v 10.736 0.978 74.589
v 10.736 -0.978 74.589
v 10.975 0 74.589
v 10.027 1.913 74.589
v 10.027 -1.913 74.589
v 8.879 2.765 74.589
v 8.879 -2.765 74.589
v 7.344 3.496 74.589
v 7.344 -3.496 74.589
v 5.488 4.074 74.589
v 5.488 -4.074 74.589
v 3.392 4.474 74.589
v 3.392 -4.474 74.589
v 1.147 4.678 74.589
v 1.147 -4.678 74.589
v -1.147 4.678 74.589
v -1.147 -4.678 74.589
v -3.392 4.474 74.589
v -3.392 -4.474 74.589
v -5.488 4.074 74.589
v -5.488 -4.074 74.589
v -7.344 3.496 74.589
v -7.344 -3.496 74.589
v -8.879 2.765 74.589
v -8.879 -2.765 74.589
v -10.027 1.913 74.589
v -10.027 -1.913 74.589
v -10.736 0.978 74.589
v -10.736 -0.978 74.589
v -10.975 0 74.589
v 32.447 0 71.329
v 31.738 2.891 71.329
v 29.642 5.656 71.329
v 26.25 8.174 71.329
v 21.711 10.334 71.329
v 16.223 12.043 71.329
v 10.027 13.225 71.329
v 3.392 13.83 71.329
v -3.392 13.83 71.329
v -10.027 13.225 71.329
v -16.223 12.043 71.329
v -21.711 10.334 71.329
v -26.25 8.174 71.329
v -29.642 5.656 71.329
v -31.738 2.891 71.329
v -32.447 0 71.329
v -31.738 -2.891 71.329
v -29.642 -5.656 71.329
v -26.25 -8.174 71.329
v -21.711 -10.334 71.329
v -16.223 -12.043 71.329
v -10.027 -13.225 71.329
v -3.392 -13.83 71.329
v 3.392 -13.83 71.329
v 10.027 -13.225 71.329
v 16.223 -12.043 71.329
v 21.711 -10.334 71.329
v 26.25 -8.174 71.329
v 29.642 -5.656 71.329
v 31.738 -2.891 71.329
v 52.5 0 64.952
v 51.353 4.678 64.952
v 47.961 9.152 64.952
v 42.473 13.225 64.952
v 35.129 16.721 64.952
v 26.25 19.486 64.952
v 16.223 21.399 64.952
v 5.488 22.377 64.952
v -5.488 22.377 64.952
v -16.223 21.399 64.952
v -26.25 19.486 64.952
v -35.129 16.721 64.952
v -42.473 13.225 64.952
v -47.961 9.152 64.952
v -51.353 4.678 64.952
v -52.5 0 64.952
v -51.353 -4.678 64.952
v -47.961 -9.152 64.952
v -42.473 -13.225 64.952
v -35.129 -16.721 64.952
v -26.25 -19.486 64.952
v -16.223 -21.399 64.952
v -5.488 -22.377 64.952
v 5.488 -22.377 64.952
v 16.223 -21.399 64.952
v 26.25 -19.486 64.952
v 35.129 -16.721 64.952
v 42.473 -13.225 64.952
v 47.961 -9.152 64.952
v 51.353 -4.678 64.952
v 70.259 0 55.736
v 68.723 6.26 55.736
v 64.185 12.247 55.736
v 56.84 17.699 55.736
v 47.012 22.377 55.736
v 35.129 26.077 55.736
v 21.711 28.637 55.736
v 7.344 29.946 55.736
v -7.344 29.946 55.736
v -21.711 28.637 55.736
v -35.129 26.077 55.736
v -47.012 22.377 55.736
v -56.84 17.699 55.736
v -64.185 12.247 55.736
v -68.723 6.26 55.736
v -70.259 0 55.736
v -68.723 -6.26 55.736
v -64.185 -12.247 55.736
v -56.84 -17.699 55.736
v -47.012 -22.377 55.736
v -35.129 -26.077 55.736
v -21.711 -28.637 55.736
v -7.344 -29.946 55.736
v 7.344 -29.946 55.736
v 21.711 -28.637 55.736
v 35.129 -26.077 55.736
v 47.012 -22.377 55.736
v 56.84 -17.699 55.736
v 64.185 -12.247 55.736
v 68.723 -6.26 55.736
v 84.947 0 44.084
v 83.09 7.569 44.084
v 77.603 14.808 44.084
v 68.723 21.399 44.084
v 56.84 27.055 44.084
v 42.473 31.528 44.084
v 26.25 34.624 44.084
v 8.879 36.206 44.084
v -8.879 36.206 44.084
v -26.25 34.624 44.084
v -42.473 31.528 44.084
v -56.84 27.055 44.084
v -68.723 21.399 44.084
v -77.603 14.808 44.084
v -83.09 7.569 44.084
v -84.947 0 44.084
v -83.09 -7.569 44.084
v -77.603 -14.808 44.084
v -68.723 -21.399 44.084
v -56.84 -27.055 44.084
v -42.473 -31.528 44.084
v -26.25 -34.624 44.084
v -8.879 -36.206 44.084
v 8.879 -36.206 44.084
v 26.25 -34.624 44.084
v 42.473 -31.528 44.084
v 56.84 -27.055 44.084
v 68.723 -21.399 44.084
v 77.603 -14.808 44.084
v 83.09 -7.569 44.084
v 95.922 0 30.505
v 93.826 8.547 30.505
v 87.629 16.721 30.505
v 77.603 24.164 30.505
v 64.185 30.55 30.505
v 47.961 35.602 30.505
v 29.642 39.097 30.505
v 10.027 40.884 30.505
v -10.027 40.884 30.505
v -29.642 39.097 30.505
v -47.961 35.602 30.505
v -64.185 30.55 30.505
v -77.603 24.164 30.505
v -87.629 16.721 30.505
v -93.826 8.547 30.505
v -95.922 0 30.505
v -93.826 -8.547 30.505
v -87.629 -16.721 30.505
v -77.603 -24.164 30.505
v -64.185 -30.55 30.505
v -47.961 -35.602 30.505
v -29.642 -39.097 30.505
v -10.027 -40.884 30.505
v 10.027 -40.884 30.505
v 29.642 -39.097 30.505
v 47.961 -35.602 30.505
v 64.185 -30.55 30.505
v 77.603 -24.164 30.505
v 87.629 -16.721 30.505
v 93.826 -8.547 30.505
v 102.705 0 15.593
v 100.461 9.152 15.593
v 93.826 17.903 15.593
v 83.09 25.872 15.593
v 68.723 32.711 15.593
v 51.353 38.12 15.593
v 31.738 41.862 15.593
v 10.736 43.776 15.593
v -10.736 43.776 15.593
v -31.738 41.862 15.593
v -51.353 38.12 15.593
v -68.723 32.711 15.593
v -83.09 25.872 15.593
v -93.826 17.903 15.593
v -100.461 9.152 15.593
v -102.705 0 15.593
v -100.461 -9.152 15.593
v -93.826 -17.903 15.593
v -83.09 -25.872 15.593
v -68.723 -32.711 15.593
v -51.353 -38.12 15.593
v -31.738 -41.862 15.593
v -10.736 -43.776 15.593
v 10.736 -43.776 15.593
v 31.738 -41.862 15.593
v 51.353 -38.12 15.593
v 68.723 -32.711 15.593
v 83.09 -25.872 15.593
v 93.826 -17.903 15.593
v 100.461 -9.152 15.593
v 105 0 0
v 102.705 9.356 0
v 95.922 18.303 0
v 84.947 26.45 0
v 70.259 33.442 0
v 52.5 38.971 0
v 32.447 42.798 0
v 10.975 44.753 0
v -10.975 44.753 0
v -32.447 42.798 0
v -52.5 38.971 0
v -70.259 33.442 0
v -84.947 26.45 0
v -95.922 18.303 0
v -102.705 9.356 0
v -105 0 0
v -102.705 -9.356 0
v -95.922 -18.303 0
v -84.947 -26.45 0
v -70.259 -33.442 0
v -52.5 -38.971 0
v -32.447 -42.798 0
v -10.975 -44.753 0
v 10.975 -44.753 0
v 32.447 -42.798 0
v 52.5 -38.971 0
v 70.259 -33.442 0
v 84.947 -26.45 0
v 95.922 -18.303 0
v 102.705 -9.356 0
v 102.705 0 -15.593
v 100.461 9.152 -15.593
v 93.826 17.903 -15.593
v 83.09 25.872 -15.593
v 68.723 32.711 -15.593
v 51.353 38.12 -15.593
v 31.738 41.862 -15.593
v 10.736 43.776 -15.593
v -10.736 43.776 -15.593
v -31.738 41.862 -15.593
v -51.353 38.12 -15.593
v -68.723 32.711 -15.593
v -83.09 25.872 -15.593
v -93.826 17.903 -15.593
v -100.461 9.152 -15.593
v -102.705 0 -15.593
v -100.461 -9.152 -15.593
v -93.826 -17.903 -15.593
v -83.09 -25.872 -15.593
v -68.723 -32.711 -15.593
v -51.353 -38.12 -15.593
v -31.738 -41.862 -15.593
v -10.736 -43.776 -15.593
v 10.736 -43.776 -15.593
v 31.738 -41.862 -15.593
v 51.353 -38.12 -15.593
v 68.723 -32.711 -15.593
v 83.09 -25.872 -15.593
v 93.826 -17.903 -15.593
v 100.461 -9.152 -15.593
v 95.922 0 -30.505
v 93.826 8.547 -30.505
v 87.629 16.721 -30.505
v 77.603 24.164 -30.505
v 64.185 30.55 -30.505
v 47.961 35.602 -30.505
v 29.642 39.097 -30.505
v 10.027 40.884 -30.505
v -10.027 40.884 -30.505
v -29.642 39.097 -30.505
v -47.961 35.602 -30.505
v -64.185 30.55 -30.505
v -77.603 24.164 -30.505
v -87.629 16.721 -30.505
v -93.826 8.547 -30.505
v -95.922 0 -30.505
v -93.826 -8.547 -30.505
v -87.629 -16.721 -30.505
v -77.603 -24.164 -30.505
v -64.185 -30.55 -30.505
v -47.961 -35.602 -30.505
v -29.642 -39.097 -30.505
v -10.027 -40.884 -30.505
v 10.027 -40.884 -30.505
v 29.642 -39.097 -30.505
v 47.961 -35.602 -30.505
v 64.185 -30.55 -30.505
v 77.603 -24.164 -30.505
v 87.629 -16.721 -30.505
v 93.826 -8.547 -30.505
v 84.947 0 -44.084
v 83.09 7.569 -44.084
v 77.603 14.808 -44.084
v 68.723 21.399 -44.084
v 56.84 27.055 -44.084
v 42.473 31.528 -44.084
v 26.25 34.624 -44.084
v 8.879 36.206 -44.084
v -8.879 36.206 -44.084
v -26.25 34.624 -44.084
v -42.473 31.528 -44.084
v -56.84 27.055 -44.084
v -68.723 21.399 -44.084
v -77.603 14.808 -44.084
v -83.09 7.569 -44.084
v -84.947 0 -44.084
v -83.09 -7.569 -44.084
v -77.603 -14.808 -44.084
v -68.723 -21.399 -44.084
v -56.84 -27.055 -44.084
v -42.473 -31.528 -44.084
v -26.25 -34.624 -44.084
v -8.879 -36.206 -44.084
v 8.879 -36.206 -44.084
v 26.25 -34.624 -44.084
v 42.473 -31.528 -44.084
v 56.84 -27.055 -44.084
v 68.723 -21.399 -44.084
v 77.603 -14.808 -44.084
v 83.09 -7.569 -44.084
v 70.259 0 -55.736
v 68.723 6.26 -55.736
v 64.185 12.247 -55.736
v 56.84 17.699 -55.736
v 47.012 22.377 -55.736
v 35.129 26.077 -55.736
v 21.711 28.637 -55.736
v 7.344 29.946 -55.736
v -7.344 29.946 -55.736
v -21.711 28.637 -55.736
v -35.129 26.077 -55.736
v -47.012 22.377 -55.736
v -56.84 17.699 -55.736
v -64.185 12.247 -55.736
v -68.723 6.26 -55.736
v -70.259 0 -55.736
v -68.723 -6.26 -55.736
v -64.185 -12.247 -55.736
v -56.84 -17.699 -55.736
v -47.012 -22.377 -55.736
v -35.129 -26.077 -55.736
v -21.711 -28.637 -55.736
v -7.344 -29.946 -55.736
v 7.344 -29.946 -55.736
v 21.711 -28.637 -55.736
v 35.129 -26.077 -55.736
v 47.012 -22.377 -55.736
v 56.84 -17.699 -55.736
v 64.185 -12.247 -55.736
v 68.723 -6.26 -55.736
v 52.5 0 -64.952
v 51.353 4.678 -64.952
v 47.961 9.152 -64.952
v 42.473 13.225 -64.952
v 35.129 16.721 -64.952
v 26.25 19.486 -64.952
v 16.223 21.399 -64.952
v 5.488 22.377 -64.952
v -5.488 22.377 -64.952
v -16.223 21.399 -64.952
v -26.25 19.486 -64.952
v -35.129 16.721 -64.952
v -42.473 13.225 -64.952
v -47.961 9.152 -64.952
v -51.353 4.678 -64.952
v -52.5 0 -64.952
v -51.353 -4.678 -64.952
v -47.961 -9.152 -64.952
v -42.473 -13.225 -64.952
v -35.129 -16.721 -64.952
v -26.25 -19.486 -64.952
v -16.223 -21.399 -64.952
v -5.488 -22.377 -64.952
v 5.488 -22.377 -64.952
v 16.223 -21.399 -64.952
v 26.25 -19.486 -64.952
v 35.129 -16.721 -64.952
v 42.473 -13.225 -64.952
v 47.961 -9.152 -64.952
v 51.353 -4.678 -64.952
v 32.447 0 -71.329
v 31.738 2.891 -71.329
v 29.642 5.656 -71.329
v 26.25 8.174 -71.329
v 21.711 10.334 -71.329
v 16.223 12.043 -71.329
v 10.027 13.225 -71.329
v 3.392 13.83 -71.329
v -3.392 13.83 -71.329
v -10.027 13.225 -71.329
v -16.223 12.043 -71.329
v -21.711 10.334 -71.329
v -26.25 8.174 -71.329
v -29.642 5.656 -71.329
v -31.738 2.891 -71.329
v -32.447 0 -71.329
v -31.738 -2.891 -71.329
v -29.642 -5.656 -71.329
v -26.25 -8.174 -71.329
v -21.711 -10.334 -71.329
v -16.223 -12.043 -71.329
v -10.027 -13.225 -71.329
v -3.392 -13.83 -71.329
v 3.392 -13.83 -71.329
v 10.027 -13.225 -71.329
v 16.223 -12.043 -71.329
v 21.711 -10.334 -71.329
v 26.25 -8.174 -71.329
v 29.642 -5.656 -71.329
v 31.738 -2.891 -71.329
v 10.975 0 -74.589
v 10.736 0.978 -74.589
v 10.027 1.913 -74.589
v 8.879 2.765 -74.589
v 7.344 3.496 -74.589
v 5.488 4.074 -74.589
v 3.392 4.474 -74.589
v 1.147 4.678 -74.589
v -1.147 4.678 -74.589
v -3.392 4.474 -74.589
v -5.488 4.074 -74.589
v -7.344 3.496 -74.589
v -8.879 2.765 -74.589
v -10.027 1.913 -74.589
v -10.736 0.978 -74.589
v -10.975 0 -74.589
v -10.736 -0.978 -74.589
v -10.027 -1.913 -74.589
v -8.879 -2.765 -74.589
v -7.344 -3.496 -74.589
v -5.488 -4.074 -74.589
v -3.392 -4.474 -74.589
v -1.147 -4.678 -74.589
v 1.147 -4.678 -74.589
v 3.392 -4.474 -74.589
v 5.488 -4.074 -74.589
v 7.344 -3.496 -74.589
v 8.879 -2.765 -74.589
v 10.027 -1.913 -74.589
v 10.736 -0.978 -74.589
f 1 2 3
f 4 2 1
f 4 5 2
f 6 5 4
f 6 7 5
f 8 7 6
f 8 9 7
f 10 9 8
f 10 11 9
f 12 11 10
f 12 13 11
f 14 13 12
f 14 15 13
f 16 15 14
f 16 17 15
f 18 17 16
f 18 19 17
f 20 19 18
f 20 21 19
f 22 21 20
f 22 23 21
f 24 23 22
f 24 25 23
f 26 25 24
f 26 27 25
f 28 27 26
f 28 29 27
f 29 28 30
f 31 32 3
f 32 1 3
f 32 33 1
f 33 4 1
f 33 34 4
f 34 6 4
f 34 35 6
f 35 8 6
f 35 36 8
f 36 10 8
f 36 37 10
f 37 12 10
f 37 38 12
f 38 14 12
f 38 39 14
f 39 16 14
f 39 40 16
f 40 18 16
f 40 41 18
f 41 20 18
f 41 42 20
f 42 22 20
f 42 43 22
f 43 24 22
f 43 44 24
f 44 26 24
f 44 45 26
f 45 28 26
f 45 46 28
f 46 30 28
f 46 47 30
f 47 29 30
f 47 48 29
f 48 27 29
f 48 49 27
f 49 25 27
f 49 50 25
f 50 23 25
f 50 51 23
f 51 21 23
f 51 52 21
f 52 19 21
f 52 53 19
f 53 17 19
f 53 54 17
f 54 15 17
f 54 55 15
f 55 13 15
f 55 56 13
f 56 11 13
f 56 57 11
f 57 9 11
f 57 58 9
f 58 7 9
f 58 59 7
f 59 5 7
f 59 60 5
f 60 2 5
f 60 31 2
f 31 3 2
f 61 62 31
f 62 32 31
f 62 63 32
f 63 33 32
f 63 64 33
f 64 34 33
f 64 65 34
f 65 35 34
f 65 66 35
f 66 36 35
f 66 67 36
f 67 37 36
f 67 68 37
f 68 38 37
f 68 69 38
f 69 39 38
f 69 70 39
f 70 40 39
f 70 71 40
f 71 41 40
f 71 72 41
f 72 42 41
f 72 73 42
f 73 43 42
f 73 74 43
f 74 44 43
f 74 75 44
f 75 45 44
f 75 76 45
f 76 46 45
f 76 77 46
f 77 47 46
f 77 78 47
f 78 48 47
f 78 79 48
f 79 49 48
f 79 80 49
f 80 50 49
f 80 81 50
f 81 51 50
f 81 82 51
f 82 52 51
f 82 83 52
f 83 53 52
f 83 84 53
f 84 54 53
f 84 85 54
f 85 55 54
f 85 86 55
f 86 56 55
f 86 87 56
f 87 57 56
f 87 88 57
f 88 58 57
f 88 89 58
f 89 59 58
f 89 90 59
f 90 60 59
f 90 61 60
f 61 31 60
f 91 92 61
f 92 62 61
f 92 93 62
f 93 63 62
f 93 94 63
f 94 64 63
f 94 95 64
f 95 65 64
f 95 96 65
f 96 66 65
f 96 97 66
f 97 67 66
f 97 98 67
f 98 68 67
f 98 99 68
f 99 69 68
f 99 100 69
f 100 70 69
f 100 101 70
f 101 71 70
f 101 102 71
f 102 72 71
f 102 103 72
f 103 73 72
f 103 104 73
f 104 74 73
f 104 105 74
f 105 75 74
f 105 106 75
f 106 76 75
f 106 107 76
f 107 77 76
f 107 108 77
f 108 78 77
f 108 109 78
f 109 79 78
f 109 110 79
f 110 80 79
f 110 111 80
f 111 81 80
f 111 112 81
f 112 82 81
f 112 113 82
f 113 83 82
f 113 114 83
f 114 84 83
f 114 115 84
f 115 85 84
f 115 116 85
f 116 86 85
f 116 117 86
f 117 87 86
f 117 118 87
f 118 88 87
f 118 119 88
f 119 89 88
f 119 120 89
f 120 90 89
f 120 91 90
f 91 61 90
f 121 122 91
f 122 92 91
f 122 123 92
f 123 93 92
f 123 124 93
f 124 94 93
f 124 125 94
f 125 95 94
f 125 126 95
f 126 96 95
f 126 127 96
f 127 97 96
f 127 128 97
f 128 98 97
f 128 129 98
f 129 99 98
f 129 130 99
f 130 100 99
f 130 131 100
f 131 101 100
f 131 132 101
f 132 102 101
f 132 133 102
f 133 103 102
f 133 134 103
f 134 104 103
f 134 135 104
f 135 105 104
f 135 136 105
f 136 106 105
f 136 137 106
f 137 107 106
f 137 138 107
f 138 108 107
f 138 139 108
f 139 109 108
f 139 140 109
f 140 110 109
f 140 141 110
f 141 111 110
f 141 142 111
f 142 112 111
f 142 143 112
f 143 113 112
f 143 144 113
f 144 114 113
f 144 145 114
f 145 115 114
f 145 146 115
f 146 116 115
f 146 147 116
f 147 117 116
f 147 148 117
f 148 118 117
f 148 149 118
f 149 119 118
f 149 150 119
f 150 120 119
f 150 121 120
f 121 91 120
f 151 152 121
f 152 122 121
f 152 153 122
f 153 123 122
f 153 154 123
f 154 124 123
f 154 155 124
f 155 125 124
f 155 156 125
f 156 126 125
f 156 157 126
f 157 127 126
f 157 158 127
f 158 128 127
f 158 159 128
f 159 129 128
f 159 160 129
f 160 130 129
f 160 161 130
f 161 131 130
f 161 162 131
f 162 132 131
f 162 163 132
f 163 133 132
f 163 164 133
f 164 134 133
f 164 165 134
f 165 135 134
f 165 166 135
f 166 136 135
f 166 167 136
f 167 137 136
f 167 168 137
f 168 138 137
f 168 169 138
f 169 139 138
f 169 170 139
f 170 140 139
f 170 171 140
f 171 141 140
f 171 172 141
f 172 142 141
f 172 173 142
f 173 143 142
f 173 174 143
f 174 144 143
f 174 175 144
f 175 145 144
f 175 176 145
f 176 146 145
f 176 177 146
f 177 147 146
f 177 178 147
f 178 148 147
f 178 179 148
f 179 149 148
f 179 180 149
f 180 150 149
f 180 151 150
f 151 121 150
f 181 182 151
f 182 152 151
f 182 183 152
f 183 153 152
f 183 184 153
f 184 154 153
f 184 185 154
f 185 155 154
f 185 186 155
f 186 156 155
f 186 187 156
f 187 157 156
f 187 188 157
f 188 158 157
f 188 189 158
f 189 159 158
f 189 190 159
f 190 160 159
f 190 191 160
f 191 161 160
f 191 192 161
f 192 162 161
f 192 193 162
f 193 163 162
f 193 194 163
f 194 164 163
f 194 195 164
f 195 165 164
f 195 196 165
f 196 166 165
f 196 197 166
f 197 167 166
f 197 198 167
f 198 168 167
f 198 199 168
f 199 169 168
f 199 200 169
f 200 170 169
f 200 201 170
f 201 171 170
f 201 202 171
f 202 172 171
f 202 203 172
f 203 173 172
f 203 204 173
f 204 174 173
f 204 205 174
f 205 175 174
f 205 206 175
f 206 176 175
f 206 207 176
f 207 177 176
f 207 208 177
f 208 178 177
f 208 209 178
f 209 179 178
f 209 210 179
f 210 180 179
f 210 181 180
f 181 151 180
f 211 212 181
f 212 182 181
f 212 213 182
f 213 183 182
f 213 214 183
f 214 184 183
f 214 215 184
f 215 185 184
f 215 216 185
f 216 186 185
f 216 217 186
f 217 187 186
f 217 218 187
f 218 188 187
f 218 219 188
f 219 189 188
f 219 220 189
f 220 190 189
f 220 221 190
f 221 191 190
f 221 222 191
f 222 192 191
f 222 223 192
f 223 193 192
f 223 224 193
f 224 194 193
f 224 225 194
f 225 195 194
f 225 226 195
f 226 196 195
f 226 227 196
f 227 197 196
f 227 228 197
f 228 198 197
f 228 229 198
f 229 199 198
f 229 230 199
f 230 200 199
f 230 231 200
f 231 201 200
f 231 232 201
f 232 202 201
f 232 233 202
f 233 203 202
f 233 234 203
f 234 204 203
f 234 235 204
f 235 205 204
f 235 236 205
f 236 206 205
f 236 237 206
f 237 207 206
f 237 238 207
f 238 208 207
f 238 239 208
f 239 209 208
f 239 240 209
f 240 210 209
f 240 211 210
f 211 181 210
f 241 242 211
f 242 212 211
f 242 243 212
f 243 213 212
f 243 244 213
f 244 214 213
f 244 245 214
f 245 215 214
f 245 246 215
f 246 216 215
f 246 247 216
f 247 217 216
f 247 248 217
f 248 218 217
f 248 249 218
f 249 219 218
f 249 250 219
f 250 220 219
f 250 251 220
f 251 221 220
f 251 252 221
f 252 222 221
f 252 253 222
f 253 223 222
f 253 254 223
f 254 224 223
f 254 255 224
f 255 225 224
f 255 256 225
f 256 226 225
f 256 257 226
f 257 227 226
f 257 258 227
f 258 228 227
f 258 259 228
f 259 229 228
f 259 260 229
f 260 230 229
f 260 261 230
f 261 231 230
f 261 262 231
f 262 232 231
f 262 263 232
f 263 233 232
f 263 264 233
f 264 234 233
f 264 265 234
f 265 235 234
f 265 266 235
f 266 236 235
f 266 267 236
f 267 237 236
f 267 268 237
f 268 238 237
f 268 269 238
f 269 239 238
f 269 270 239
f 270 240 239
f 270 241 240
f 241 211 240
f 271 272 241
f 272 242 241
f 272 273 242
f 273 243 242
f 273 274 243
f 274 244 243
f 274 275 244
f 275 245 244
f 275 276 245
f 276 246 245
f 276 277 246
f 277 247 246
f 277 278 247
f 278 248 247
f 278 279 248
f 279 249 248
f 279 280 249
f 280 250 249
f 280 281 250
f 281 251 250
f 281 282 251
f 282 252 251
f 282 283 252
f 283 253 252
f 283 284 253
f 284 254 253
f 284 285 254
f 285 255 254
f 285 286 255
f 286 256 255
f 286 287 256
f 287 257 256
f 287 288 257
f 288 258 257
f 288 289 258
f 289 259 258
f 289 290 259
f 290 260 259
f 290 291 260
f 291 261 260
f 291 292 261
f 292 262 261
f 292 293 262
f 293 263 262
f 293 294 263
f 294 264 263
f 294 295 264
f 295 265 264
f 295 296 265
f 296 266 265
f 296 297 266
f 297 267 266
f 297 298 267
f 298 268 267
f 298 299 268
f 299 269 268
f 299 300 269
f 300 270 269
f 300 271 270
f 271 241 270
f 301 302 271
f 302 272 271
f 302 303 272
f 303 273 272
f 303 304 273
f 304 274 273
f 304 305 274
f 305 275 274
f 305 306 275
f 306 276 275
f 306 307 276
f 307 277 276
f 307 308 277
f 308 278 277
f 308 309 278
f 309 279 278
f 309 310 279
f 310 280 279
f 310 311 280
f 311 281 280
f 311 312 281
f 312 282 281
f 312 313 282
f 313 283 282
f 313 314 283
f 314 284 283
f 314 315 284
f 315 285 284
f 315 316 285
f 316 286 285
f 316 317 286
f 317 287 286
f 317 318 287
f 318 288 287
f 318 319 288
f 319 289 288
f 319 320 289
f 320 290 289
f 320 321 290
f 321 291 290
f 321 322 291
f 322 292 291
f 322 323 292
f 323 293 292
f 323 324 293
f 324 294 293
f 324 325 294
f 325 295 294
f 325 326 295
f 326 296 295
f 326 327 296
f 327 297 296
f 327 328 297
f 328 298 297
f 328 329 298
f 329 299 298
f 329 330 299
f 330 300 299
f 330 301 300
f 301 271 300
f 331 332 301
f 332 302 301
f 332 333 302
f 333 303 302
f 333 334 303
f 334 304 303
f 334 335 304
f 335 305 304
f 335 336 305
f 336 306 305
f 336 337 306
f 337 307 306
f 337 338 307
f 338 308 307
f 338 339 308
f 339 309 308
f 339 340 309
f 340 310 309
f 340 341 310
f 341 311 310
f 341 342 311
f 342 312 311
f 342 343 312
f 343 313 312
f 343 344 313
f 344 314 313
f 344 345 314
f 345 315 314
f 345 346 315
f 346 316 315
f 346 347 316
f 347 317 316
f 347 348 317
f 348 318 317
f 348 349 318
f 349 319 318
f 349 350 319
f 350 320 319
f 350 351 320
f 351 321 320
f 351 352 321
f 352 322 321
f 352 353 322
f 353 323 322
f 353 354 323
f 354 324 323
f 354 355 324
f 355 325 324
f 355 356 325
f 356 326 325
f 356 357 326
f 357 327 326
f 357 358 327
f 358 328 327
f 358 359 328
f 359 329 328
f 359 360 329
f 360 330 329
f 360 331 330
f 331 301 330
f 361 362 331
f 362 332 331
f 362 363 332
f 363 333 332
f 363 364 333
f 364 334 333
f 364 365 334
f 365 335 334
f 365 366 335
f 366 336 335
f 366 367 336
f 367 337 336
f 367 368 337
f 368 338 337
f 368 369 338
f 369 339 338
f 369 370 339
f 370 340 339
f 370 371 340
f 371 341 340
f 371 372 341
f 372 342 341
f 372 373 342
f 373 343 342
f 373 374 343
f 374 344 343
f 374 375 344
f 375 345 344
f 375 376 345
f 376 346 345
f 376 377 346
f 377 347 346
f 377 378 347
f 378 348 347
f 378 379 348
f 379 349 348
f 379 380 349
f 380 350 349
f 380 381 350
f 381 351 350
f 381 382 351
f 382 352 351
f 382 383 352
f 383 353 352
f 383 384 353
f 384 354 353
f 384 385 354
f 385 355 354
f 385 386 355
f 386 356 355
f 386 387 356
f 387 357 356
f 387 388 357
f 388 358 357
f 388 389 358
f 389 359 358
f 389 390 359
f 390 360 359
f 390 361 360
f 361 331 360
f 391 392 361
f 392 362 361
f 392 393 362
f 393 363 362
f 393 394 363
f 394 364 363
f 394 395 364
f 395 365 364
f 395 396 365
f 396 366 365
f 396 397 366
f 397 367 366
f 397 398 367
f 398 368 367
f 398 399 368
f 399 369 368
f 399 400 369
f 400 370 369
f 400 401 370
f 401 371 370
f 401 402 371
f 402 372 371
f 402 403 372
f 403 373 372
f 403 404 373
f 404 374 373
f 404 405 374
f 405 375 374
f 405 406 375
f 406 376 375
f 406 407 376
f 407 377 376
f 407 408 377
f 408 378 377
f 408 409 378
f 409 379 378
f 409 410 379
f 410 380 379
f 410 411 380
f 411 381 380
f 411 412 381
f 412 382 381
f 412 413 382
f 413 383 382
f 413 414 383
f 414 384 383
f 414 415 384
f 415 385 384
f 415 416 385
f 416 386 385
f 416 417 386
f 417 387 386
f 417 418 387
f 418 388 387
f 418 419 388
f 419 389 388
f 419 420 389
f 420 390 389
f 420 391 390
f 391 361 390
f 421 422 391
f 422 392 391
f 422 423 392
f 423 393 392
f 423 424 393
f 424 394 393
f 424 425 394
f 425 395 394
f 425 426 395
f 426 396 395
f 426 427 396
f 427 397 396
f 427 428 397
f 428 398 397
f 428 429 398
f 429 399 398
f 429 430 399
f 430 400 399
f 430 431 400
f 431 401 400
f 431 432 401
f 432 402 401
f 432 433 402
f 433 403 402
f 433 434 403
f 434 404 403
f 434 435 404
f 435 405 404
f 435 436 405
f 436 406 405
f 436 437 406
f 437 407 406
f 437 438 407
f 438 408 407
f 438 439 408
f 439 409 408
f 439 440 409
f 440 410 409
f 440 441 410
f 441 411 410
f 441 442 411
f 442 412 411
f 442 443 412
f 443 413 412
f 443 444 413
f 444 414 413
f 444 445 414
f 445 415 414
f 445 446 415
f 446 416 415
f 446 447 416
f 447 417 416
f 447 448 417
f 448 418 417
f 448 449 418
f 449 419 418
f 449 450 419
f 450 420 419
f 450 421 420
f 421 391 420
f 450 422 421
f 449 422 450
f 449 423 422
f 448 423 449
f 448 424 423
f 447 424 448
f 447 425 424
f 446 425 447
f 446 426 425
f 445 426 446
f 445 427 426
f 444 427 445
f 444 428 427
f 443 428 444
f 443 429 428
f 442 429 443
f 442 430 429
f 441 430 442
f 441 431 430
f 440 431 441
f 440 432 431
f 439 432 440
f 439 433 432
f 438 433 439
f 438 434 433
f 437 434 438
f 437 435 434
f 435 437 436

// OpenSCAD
// Generated by SolidPython 1.0.1 on 2020-07-29 00:46:47


scale(v = [7, 3, 5]) {
	sphere(r = 15);
}
/***********************************************
*********      SolidPython code:      **********
************************************************
 
# import packages: SolidPython
from solid import *
from solid.utils import *
from itertools import chain, combinations, permutations


class Resize:

    def __init__(self, scad_file):
        self.scad_file = scad_file
        #self.scad_file = import_scad(scad_file)
        # cone/cylinder param:
        self.r1 = 0
        self.r2 = 0
        self.h = 0
        # rectangular prism param:
        self.w = 0
        self.l = 0
        # ellipse param:
        self.r = 0

    # import OpenScad code (file name corresponds to shape)


    # classify shape + parameters
    def assign(self, param1, param2, param3):
        if self.scad_file == 'cone.scad':
            self.r1 = param1
            self.r2 = param2
            self.h = param3
        elif self.scad_file == 'cylinder.scad':
            self.r1 = param1
            self.r2 = param2
            self.h = param3
        elif self.scad_file == 'rectangularPrism.scad':
            self.h = param1
            self.l = param2
            self.w = param3
        else:
            self.r = param1
            self.h = param2

    # resize parameters
    def iterate(self):
        x = range(3, 20, 2)
        i = 1
        if self.scad_file == 'cone.scad':
            tempList = list(permutations(x, 2))
            for temp in tempList:
                param1 = temp[0]
                param2 = temp[1]
                filepath = 'produced_scad_files/' + 'cone' + str(param1) + '_' + str(param2) + '_' + '.scad'
                scad_render_to_file(cylinder(h=param1, r1=param2, r2=0), filepath)

        elif self.scad_file == 'cylinder.scad':
            tempList = list(permutations(x, 3))
            for temp in tempList:
                param1 = temp[0]
                param2 = temp[1]
                filepath = 'produced_scad_files/' + 'cylinder' + str(param1) + '_' + str(param2) + '_' + '.scad'
                scad_render_to_file(cylinder(h=param1, r1=param2, r2=param2), filepath)

        elif self.scad_file == 'rectangularPrism.scad':
            tempList = list(permutations(x, 3))
            for temp in tempList:
                param1 = temp[0]
                param2 = temp[1]
                param3 = temp[2]
                filepath = 'produced_scad_files/' + 'rectangularPrism' + str(param1) + '_' + str(param2) + '_' + str(
                    param3) + '.scad'
                scad_render_to_file(cube(size=(param1, param2, param3)), filepath)

        elif self.scad_file == 'ellipse.scad':
            tempList = list(permutations(x, 4))
            for temp in tempList:
                param1 = temp[0]
                param2 = temp[1]
                param3 = temp[2]
                param4 = temp[3]
                filepath = 'produced_scad_files/' + 'ellipse' + str(param1) + '_' + str(param2) + '_' + str(param3) + '_' + str(param4) + '.scad'
                scad_render_to_file(scale([param1, param2, param3])(sphere(r=param4)), filepath)

    def render_to_scadfile(self):
        scad_render_to_file(scad, 'example.scad') 
 
************************************************/
